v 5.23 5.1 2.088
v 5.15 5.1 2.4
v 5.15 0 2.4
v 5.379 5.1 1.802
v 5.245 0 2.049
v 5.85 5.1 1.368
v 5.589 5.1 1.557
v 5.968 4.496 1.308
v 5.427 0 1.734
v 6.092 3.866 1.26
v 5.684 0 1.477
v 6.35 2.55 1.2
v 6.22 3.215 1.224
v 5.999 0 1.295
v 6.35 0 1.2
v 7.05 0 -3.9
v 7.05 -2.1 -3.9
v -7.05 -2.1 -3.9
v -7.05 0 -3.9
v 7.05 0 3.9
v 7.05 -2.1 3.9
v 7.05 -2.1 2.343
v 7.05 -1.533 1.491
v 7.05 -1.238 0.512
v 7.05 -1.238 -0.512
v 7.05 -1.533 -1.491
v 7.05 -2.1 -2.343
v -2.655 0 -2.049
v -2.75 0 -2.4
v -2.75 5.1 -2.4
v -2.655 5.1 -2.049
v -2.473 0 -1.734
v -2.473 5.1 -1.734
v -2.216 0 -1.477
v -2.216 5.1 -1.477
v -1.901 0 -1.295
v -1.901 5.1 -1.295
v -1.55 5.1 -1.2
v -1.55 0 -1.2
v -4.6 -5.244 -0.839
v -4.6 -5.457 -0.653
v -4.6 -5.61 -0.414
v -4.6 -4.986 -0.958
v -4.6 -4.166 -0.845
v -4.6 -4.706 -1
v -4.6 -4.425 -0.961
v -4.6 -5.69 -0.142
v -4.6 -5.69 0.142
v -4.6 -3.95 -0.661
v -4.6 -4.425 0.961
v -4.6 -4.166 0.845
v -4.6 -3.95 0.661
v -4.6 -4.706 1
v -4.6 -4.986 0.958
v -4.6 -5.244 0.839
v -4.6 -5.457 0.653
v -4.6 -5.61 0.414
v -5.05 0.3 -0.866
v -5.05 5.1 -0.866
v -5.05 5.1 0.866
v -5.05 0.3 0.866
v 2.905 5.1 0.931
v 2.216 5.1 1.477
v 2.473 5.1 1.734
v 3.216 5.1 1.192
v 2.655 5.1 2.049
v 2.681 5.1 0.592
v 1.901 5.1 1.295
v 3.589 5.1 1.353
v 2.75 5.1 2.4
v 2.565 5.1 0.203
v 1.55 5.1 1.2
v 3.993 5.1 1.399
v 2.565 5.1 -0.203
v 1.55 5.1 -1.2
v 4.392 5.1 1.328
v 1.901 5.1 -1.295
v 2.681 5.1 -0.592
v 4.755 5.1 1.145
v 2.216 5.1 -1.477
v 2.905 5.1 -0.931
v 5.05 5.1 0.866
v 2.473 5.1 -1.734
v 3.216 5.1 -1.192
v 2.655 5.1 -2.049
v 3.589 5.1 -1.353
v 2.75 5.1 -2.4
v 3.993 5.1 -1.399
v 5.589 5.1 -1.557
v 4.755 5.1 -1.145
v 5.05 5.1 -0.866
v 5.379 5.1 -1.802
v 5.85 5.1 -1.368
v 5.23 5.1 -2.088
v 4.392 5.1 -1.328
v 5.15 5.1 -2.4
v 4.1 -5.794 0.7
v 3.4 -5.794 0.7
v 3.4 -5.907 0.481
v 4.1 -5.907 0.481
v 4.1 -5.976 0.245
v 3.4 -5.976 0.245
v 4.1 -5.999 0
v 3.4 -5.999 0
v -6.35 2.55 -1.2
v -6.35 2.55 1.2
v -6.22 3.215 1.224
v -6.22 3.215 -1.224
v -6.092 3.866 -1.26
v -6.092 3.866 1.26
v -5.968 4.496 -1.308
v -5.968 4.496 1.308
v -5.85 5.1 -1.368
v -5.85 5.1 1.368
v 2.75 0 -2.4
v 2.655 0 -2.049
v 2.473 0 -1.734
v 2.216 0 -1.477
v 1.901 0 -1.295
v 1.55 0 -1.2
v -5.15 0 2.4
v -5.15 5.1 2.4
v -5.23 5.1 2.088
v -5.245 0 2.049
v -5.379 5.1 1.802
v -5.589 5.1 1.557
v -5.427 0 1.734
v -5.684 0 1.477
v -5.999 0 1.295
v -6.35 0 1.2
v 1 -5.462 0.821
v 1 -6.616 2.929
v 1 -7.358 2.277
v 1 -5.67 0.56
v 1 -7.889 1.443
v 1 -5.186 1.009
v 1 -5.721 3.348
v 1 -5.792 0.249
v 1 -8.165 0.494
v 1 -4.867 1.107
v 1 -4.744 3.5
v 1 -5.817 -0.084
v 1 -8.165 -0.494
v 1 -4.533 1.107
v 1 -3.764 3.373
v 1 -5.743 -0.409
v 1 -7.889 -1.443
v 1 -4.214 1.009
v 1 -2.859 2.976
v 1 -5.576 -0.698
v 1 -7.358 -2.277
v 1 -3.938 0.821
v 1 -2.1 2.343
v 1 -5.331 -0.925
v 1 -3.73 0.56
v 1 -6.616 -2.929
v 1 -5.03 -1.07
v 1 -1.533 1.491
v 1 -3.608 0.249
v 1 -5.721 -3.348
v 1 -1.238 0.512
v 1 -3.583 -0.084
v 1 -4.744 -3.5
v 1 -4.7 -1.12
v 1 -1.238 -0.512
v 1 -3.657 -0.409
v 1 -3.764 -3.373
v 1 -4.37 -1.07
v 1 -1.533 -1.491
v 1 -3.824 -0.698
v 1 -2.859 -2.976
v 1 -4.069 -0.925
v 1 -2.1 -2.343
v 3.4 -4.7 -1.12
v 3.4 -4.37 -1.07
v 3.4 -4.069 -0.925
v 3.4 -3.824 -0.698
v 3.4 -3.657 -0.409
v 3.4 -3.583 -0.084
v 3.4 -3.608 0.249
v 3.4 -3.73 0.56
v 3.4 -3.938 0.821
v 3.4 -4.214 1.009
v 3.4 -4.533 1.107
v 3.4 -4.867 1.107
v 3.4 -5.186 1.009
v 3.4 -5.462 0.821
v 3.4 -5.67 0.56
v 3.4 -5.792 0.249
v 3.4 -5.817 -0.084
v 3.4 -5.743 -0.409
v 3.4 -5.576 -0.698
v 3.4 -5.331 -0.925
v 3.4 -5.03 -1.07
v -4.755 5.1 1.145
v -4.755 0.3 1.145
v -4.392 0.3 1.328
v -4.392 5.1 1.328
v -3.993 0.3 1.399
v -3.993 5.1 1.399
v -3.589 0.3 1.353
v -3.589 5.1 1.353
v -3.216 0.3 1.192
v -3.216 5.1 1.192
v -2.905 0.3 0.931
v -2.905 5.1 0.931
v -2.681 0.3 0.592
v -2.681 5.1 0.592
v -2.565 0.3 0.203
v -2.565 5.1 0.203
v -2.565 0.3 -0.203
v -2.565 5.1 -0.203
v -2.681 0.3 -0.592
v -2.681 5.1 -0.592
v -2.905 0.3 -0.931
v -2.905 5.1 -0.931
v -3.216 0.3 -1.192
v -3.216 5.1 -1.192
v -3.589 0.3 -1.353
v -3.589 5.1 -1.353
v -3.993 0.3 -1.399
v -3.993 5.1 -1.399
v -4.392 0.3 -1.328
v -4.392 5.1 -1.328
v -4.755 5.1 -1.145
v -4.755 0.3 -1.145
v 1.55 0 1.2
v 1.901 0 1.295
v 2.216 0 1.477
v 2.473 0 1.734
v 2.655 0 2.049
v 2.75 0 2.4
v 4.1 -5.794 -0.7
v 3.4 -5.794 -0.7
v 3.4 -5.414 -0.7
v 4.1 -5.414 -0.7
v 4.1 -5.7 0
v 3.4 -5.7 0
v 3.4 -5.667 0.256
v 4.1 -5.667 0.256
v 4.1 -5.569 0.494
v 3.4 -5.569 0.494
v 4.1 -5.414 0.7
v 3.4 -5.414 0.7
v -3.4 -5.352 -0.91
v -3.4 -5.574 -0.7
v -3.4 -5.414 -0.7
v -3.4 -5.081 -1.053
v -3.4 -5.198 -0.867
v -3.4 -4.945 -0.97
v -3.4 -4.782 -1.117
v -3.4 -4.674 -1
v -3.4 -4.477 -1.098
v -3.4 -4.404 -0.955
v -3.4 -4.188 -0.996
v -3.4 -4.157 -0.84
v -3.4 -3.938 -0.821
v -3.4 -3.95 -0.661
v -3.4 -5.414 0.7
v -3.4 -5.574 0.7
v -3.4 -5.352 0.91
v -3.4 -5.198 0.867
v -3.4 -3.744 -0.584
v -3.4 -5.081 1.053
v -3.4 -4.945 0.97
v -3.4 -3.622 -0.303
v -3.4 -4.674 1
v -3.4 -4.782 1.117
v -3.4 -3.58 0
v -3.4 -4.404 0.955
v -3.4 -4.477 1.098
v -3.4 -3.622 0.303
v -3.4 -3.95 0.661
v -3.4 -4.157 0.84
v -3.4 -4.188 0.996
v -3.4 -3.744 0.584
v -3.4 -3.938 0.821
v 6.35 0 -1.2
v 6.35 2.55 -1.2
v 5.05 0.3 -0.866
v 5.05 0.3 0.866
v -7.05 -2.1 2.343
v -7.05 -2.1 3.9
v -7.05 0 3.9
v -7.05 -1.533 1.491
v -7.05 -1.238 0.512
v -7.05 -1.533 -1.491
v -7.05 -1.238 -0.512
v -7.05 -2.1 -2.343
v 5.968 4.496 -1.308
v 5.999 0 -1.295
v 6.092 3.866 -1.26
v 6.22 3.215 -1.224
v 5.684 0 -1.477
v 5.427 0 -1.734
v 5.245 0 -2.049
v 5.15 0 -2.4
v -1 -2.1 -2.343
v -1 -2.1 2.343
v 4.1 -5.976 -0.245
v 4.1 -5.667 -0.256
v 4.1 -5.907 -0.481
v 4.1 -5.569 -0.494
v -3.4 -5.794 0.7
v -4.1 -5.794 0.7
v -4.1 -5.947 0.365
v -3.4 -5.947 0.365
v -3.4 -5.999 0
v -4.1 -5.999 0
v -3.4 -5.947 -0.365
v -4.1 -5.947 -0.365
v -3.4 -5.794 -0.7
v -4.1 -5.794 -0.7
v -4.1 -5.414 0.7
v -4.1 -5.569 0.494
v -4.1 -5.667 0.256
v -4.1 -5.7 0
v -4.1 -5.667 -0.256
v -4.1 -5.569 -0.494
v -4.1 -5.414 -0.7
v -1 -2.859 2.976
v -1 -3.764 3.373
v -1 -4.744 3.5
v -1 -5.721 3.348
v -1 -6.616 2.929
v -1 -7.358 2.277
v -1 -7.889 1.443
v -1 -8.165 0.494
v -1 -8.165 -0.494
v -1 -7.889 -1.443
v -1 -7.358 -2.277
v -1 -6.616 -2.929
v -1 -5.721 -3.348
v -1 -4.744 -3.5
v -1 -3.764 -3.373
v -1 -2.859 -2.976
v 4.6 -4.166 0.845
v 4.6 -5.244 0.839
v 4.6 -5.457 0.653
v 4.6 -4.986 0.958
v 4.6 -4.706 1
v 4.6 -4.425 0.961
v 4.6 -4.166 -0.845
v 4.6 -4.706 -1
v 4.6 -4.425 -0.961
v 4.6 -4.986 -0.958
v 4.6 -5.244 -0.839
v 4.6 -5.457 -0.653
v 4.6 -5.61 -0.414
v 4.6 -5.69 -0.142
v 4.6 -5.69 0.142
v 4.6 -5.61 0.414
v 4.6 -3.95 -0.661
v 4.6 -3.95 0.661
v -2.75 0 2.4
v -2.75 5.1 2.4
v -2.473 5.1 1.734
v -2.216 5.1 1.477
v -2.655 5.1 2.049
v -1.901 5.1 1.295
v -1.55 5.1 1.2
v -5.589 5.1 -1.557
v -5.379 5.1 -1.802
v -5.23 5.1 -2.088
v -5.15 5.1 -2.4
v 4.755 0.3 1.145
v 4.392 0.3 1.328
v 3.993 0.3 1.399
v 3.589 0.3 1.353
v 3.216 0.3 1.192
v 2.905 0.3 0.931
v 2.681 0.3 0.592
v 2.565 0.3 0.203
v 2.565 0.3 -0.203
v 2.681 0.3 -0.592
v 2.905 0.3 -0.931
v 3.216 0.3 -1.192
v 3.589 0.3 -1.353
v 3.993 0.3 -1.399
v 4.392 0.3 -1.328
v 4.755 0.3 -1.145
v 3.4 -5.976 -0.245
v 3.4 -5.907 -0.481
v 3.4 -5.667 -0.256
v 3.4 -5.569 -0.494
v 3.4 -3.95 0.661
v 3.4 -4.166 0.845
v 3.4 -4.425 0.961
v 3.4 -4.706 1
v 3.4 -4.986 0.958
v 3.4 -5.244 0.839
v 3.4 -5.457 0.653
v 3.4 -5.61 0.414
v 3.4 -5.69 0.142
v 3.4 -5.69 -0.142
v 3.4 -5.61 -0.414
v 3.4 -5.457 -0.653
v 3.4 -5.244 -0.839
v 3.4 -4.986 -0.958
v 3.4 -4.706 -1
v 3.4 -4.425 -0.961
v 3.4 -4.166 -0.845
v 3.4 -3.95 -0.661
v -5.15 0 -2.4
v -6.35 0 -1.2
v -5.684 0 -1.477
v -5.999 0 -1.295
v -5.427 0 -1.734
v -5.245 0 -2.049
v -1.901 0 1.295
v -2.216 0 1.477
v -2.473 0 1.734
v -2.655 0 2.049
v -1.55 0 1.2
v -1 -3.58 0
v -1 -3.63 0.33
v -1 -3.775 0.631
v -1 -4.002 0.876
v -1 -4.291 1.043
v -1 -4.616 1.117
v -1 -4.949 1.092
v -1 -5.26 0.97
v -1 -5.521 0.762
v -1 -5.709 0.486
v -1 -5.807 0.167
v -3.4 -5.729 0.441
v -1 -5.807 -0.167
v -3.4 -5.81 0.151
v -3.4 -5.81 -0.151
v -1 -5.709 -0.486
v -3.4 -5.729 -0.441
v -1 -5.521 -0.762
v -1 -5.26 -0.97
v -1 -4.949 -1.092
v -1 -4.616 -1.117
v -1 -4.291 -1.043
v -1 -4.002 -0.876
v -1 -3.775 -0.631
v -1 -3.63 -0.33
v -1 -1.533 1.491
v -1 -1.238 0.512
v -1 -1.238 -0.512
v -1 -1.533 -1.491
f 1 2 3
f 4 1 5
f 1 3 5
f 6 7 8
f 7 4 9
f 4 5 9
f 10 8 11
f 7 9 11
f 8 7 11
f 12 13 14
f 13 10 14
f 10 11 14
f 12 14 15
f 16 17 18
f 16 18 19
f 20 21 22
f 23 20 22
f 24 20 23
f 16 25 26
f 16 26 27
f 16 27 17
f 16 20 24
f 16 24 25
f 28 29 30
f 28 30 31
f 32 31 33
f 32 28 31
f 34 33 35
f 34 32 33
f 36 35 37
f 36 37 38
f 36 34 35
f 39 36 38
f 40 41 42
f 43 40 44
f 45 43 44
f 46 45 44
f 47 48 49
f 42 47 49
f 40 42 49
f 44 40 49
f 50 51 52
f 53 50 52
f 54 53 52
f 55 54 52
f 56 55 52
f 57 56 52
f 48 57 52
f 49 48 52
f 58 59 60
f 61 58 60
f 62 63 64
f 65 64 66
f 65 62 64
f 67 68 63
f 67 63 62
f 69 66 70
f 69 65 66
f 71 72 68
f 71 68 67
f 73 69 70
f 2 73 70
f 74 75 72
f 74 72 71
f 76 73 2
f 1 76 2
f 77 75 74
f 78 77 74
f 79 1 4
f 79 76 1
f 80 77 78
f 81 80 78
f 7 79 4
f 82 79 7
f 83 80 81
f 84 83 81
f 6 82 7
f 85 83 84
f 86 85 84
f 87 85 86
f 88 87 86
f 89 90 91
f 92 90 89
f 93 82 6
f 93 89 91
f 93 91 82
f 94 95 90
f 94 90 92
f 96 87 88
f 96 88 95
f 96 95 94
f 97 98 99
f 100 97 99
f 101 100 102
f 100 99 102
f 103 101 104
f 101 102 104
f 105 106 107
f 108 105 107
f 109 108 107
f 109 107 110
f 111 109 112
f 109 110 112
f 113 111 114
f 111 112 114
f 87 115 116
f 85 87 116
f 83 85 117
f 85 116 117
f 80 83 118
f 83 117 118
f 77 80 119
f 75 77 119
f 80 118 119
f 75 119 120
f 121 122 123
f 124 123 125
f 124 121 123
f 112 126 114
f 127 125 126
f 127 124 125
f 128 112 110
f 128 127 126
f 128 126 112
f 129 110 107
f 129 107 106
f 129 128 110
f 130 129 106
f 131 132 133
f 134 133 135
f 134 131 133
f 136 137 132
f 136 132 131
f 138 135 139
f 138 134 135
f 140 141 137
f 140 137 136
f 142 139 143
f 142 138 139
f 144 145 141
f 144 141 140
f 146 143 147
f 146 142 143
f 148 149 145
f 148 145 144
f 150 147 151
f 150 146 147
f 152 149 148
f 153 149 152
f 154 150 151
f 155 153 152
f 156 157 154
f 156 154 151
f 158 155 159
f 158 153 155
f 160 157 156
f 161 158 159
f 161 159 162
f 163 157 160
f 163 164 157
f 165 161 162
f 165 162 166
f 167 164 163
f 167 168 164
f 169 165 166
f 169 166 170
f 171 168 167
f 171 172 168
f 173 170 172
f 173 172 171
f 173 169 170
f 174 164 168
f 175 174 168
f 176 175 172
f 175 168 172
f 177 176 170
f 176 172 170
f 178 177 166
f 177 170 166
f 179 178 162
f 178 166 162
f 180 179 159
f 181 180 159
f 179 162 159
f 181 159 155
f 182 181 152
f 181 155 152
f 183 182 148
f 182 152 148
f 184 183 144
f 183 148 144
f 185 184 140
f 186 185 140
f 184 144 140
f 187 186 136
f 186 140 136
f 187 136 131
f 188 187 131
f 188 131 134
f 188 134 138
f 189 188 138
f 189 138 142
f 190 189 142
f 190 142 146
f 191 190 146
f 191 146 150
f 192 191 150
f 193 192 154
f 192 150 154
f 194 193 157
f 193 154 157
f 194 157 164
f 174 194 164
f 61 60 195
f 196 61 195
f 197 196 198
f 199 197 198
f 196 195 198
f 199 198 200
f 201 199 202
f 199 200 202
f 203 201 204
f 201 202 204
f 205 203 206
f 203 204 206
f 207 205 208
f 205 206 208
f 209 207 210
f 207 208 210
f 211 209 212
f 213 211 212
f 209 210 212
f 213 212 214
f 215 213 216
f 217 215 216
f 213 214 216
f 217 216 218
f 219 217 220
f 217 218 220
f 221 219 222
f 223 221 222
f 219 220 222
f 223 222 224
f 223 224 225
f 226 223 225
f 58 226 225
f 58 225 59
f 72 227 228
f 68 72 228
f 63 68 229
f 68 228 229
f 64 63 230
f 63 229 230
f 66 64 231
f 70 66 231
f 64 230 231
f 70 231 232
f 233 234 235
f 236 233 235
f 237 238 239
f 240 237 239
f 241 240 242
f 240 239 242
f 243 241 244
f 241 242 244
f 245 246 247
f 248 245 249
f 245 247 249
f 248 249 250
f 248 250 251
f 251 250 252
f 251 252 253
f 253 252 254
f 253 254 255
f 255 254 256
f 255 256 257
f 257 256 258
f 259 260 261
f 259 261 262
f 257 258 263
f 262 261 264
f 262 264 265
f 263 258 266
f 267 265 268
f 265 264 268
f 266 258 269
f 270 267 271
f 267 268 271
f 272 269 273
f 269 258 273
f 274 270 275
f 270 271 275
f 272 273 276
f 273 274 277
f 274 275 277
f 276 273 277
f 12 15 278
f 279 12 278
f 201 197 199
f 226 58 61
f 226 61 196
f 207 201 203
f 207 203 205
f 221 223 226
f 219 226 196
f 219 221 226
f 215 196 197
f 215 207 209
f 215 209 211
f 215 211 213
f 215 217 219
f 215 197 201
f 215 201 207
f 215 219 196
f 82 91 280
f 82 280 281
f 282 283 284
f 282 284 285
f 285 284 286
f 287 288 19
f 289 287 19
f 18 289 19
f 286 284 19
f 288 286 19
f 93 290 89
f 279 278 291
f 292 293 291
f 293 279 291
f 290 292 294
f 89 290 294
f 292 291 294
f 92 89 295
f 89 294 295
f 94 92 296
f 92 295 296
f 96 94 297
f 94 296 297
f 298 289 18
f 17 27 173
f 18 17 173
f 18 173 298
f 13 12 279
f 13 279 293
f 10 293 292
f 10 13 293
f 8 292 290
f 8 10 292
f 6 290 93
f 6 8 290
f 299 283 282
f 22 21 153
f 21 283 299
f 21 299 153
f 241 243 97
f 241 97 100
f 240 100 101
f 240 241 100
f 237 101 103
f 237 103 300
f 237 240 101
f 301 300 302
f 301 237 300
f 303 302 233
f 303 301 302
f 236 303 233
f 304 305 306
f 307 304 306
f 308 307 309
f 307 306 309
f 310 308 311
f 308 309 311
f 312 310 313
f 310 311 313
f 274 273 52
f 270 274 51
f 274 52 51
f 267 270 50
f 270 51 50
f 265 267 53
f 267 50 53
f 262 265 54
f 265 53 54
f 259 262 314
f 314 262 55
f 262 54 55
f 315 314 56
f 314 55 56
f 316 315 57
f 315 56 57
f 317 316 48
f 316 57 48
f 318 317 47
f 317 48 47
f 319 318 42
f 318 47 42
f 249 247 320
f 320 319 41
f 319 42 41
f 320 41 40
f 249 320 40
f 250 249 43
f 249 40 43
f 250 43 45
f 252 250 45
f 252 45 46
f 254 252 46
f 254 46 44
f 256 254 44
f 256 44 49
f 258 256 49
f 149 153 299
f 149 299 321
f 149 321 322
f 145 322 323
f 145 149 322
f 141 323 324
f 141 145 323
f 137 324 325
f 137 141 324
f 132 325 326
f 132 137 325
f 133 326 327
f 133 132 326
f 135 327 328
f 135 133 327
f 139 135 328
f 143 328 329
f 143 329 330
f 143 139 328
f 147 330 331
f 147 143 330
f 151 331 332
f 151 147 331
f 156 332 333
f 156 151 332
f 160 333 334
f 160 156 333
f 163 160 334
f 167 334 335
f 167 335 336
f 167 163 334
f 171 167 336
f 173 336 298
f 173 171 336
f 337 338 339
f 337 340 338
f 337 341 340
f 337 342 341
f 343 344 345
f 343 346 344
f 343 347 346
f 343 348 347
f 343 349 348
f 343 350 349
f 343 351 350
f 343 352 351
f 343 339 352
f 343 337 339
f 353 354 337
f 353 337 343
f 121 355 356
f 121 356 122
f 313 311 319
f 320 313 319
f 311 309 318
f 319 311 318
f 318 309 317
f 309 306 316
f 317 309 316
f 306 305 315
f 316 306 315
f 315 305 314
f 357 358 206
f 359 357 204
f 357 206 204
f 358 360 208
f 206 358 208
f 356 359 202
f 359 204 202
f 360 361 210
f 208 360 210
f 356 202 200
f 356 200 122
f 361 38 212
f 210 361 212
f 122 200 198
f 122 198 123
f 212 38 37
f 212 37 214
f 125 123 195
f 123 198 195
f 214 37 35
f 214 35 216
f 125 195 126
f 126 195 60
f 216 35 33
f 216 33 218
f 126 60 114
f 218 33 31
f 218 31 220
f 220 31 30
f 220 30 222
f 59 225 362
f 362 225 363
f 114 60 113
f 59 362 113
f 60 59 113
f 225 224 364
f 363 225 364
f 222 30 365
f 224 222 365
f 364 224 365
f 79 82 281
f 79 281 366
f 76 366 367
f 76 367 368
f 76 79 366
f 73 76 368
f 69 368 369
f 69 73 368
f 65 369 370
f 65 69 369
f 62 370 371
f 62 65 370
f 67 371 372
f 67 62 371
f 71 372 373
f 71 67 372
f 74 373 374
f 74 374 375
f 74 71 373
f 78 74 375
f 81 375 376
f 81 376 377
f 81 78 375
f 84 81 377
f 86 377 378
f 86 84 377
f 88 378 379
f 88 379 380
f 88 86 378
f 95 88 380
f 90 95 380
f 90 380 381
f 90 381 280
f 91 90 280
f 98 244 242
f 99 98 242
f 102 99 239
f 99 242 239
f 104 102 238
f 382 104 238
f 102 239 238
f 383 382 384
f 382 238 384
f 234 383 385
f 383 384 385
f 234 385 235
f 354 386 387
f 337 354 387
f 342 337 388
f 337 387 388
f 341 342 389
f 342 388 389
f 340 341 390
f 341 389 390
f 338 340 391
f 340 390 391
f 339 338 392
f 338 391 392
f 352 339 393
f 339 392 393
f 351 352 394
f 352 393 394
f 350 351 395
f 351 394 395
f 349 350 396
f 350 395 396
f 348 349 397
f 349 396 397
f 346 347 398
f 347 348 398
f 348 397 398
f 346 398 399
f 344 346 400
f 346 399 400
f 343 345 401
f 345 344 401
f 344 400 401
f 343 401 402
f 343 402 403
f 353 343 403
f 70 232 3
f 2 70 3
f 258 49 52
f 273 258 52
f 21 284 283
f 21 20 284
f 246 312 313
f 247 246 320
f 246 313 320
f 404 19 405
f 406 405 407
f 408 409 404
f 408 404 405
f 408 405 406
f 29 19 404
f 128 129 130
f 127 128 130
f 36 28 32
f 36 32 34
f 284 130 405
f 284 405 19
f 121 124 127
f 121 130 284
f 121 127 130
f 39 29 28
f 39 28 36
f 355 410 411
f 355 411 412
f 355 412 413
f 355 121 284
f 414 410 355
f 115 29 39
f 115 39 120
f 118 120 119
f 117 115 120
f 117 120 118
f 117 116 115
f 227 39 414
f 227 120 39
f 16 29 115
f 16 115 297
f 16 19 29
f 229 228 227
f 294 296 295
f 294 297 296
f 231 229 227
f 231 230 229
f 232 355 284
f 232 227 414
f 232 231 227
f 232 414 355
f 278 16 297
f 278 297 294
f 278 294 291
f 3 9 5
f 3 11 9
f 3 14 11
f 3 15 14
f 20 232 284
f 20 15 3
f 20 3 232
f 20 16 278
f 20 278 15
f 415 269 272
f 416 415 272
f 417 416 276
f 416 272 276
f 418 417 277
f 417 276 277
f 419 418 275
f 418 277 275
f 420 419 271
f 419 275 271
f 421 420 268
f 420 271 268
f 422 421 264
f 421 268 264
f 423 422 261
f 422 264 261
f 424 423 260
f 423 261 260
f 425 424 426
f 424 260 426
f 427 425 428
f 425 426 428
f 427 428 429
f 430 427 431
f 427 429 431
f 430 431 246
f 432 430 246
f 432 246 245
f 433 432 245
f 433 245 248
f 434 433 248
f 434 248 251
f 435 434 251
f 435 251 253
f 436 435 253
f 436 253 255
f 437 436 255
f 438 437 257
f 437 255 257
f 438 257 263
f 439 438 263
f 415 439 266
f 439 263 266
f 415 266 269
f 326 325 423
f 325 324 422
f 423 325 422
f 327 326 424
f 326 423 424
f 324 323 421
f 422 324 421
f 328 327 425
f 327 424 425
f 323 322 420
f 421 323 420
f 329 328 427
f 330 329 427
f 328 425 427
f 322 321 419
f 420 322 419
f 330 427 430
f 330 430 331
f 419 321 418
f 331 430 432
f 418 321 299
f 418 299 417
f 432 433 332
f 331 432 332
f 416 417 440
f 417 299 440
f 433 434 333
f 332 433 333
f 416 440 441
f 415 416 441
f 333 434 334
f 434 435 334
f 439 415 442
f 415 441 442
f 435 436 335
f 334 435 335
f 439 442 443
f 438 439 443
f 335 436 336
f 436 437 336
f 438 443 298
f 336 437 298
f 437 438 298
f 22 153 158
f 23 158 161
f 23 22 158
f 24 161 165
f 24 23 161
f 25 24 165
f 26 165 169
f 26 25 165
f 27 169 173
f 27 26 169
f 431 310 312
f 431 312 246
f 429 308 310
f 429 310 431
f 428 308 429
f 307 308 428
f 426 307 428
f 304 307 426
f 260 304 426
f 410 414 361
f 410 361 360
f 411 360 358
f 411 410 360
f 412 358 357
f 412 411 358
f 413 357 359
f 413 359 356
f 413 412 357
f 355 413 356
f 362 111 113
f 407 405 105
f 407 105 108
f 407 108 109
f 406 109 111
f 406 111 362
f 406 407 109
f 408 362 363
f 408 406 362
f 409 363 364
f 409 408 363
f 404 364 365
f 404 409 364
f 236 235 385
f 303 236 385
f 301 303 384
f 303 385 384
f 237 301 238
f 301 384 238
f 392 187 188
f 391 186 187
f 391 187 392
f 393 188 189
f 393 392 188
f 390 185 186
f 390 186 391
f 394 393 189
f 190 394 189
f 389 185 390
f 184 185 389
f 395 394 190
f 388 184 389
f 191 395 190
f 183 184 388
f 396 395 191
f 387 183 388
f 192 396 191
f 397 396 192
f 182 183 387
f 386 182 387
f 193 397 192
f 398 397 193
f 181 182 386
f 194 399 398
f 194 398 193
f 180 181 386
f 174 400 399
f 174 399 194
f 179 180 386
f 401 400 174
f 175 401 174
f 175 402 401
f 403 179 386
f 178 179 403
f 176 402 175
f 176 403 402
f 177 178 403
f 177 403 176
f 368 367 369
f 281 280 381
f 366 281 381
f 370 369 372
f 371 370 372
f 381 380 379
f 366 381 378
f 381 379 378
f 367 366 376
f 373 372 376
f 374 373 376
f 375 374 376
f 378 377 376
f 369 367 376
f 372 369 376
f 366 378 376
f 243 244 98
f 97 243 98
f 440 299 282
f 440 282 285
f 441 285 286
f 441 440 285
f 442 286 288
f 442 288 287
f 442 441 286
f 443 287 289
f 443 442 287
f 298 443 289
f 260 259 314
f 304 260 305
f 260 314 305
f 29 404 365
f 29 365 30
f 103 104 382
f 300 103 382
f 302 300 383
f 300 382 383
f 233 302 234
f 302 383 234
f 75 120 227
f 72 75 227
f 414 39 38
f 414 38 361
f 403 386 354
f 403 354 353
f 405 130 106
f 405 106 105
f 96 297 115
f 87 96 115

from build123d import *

# Parameters (mm, degrees)
BOSS_EXTRUDE2_DEPTH  = 7.05
SKETCH2_4_R          = 3.5
BOSS_EXTRUDE3_DEPTH  = 1
SKETCH6_R            = 1.12
BOSS_EXTRUDE4_DEPTH  = 2.4
SKETCH7_R            = 1
BOSS_EXTRUDE5_DEPTH  = 1.2
CUT_EXTRUDE1_START   = -1.2
CUT_EXTRUDE1_DEPTH   = 1.2
BOSS_EXTRUDE6_DEPTH  = 0.7
BOSS_EXTRUDE7_DEPTH  = 5.1
CUT_EXTRUDE2_DEPTH   = 4.8
CUT_EXTRUDE3_DEPTH   = 13.515290648
MIRROR10_START       = -4.6
MIRROR10_DEPTH       = 3.6
MIRROR10_START_2     = -3.4
MIRROR10_2_OUTLINE_R = 1.12
MIRROR10_2_DEPTH     = 2.4
MIRROR10_START_3     = -4.1
MIRROR10_3_DEPTH     = 0.7


# Read off the part's stored shape, not the designer's step: Mirror10
with BuildPart() as part:
    # Sketch2 → Boss-Extrude2 (new, symmetric)
    with BuildSketch(Plane(origin=(0, 0, 0), x_dir=(0, 0, -1), z_dir=(1, 0, 0))):
        with BuildLine():
            ThreePointArc((-2.343074903, -2.1), (0, -1.2), (2.343074903, -2.1))
            Line((2.343074903, -2.1), (3.9, -2.1))
            Line((3.9, -2.1), (3.9, 0))
            Line((3.9, 0), (-3.9, 0))
            Line((-3.9, 0), (-3.9, -2.1))
            Line((-3.9, -2.1), (-2.343074903, -2.1))
        make_face()
    extrude(amount=BOSS_EXTRUDE2_DEPTH, both=True)

    # Sketch2<4> → Boss-Extrude3 (add, symmetric)
    with BuildSketch(Plane(origin=(0, 0, 0), x_dir=(0, 0, -1), z_dir=(1, 0, 0))):
        with Locations((0, -4.7)):
            Circle(SKETCH2_4_R)
    extrude(amount=BOSS_EXTRUDE3_DEPTH, both=True)

    # Sketch6 → Boss-Extrude4 (add)
    with BuildSketch(Plane(origin=(1, 0, 0), x_dir=(0, 0, -1), z_dir=(1, 0, 0))):
        with Locations((0, -4.7)):
            Circle(SKETCH6_R)
    extrude(amount=BOSS_EXTRUDE4_DEPTH)

    # Sketch7 → Boss-Extrude5 (add)
    with BuildSketch(Plane(origin=(3.4, 0, 0), x_dir=(0, 0, -1), z_dir=(1, 0, 0))):
        with Locations((0, -4.7)):
            Circle(SKETCH7_R)
    extrude(amount=BOSS_EXTRUDE5_DEPTH)

    # Sketch8 → Cut-Extrude1 (cut)
    with BuildSketch(Plane(origin=(4.6, 0, 0), x_dir=(0, 0, -1), z_dir=(1, 0, 0)).offset(CUT_EXTRUDE1_START)):
        with BuildLine():
            ThreePointArc((0.661437828, -3.95), (0, -3.7), (-0.661437828, -3.95))
            Line((-0.661437828, -3.95), (0.661437828, -3.95))
        make_face()
    extrude(amount=CUT_EXTRUDE1_DEPTH, mode=Mode.SUBTRACT)

    # Sketch12 → Boss-Extrude7 (add)
    with BuildSketch(Plane(origin=(0, 0, 0), x_dir=(1, 0, 0), z_dir=(0, 1, 0))):
        with BuildLine():
            ThreePointArc((1.55, -1.2), (2.352548706, -1.597451294), (2.75, -2.4))
            Line((2.75, -2.4), (5.15, -2.4))
            ThreePointArc((5.15, -2.4), (5.547451294, -1.597451294), (6.35, -1.2))
            Line((6.35, -1.2), (6.35, 1.2))
            ThreePointArc((6.35, 1.2), (5.547451294, 1.597451294), (5.15, 2.4))
            Line((5.15, 2.4), (2.75, 2.4))
            ThreePointArc((2.75, 2.4), (2.352548706, 1.597451294), (1.55, 1.2))
            Line((1.55, 1.2), (1.55, -1.2))
        make_face()
    boss_extrude7 = extrude(amount=BOSS_EXTRUDE7_DEPTH)

    # Sketch13 → Cut-Extrude2 (cut)
    with BuildSketch(Plane(origin=(0, 5.1, 0), x_dir=(1, 0, 0), z_dir=(0, 1, 0))):
        with BuildLine():
            Line((5.05, 0.866025404), (5.05, -0.866025404))
            ThreePointArc((5.05, -0.866025404), (2.55, 0), (5.05, 0.866025404))
        make_face()
    cut_extrude2 = extrude(amount=-CUT_EXTRUDE2_DEPTH, mode=Mode.SUBTRACT)

    # Sketch16 → Cut-Extrude3 (cut, through all)
    with BuildSketch(Plane.XY.offset(2.4)):
        Polygon((5.85, 5.1), (6.35, 5.1), (6.35, 2.55), align=None)
    cut_extrude3 = extrude(amount=-CUT_EXTRUDE3_DEPTH, mode=Mode.SUBTRACT)

    # Mirror6: Boss-Extrude7, Cut-Extrude2 across plane
    add(boss_extrude7.mirror(Plane(origin=(0, 0, 0), x_dir=(0, 0, 1), z_dir=(1, 0, 0))))
    add(cut_extrude2.mirror(Plane(origin=(0, 0, 0), x_dir=(0, 0, 1), z_dir=(1, 0, 0))), mode=Mode.SUBTRACT)

    # Mirror9: Cut-Extrude3 across plane
    add(cut_extrude3.mirror(Plane(origin=(0, 0, 0), x_dir=(0, 0, 1), z_dir=(1, 0, 0))), mode=Mode.SUBTRACT)

    # Mirror10 outline → Mirror10 (add)
    with BuildSketch(Plane.YZ.offset(MIRROR10_START)):
        with BuildLine():
            ThreePointArc((-3.95, 0.661437828), (-5.7, 0), (-3.95, -0.661437828))
            Line((-3.95, -0.661437828), (-3.95, 0.661437828))
        make_face()
    extrude(amount=MIRROR10_DEPTH)

    # Mirror10 2 outline → Mirror10 2 (add)
    with BuildSketch(Plane.YZ.offset(MIRROR10_START_2)):
        with Locations((-4.7, 0)):
            Circle(MIRROR10_2_OUTLINE_R)
        with BuildLine():
            ThreePointArc((-3.95, -0.661437828), (-5.7, 0), (-3.95, 0.661437828))
            Line((-3.95, 0.661437828), (-3.95, -0.661437828))
        make_face(mode=Mode.SUBTRACT)
    extrude(amount=MIRROR10_2_DEPTH)

    # Mirror10 3 outline → Mirror10 3 (add)
    with BuildSketch(Plane.YZ.offset(MIRROR10_START_3)):
        with BuildLine():
            Line((-5.414142843, 0.7), (-5.794142843, 0.7))
            ThreePointArc((-5.794142843, 0.7), (-5.99890283, 0), (-5.794142843, -0.7))
            Line((-5.794142843, -0.7), (-5.414142843, -0.7))
            ThreePointArc((-5.414142843, -0.7), (-5.7, 0), (-5.414142843, 0.7))
        make_face()
    extrude(amount=MIRROR10_3_DEPTH)


with BuildPart() as body_2:
    # Sketch10 → Boss-Extrude6 (new body)
    with BuildSketch(Plane(origin=(3.4, 0, 0), x_dir=(0, 0, -1), z_dir=(1, 0, 0))):
        with BuildLine():
            Line((0, -5.82), (0, -5.7))
            ThreePointArc((0, -5.7), (-0.378058962, -5.625781519), (-0.7, -5.414142843))
            Line((-0.7, -5.414142843), (-0.7, -5.57429972))
            ThreePointArc((-0.7, -5.57429972), (-0.370934168, -5.756791296), (0, -5.82))
        make_face()
        with BuildLine():
            ThreePointArc((0.7, -5.414142843), (0.378058962, -5.625781519), (0, -5.7))
            Line((0, -5.7), (0, -5.82))
            ThreePointArc((0, -5.82), (0.370934168, -5.756791296), (0.7, -5.57429972))
            Line((0.7, -5.57429972), (0.7, -5.414142843))
        make_face()
        with BuildLine():
            ThreePointArc((0.7, -5.57429972), (0.370934168, -5.756791296), (0, -5.82))
            Line((0, -5.82), (0, -5.99890283))
            ThreePointArc((0, -5.99890283), (0.364666509, -5.946662303), (0.7, -5.794142843))
            Line((0.7, -5.794142843), (0.7, -5.57429972))
        make_face()
        with BuildLine():
            Line((0, -5.99890283), (0, -5.82))
            ThreePointArc((0, -5.82), (-0.370934168, -5.756791296), (-0.7, -5.57429972))
            Line((-0.7, -5.57429972), (-0.7, -5.794142843))
            ThreePointArc((-0.7, -5.794142843), (-0.364666509, -5.946662303), (0, -5.99890283))
        make_face()
    extrude(amount=BOSS_EXTRUDE6_DEPTH)


solid = Compound([part.part, body_2.part])
